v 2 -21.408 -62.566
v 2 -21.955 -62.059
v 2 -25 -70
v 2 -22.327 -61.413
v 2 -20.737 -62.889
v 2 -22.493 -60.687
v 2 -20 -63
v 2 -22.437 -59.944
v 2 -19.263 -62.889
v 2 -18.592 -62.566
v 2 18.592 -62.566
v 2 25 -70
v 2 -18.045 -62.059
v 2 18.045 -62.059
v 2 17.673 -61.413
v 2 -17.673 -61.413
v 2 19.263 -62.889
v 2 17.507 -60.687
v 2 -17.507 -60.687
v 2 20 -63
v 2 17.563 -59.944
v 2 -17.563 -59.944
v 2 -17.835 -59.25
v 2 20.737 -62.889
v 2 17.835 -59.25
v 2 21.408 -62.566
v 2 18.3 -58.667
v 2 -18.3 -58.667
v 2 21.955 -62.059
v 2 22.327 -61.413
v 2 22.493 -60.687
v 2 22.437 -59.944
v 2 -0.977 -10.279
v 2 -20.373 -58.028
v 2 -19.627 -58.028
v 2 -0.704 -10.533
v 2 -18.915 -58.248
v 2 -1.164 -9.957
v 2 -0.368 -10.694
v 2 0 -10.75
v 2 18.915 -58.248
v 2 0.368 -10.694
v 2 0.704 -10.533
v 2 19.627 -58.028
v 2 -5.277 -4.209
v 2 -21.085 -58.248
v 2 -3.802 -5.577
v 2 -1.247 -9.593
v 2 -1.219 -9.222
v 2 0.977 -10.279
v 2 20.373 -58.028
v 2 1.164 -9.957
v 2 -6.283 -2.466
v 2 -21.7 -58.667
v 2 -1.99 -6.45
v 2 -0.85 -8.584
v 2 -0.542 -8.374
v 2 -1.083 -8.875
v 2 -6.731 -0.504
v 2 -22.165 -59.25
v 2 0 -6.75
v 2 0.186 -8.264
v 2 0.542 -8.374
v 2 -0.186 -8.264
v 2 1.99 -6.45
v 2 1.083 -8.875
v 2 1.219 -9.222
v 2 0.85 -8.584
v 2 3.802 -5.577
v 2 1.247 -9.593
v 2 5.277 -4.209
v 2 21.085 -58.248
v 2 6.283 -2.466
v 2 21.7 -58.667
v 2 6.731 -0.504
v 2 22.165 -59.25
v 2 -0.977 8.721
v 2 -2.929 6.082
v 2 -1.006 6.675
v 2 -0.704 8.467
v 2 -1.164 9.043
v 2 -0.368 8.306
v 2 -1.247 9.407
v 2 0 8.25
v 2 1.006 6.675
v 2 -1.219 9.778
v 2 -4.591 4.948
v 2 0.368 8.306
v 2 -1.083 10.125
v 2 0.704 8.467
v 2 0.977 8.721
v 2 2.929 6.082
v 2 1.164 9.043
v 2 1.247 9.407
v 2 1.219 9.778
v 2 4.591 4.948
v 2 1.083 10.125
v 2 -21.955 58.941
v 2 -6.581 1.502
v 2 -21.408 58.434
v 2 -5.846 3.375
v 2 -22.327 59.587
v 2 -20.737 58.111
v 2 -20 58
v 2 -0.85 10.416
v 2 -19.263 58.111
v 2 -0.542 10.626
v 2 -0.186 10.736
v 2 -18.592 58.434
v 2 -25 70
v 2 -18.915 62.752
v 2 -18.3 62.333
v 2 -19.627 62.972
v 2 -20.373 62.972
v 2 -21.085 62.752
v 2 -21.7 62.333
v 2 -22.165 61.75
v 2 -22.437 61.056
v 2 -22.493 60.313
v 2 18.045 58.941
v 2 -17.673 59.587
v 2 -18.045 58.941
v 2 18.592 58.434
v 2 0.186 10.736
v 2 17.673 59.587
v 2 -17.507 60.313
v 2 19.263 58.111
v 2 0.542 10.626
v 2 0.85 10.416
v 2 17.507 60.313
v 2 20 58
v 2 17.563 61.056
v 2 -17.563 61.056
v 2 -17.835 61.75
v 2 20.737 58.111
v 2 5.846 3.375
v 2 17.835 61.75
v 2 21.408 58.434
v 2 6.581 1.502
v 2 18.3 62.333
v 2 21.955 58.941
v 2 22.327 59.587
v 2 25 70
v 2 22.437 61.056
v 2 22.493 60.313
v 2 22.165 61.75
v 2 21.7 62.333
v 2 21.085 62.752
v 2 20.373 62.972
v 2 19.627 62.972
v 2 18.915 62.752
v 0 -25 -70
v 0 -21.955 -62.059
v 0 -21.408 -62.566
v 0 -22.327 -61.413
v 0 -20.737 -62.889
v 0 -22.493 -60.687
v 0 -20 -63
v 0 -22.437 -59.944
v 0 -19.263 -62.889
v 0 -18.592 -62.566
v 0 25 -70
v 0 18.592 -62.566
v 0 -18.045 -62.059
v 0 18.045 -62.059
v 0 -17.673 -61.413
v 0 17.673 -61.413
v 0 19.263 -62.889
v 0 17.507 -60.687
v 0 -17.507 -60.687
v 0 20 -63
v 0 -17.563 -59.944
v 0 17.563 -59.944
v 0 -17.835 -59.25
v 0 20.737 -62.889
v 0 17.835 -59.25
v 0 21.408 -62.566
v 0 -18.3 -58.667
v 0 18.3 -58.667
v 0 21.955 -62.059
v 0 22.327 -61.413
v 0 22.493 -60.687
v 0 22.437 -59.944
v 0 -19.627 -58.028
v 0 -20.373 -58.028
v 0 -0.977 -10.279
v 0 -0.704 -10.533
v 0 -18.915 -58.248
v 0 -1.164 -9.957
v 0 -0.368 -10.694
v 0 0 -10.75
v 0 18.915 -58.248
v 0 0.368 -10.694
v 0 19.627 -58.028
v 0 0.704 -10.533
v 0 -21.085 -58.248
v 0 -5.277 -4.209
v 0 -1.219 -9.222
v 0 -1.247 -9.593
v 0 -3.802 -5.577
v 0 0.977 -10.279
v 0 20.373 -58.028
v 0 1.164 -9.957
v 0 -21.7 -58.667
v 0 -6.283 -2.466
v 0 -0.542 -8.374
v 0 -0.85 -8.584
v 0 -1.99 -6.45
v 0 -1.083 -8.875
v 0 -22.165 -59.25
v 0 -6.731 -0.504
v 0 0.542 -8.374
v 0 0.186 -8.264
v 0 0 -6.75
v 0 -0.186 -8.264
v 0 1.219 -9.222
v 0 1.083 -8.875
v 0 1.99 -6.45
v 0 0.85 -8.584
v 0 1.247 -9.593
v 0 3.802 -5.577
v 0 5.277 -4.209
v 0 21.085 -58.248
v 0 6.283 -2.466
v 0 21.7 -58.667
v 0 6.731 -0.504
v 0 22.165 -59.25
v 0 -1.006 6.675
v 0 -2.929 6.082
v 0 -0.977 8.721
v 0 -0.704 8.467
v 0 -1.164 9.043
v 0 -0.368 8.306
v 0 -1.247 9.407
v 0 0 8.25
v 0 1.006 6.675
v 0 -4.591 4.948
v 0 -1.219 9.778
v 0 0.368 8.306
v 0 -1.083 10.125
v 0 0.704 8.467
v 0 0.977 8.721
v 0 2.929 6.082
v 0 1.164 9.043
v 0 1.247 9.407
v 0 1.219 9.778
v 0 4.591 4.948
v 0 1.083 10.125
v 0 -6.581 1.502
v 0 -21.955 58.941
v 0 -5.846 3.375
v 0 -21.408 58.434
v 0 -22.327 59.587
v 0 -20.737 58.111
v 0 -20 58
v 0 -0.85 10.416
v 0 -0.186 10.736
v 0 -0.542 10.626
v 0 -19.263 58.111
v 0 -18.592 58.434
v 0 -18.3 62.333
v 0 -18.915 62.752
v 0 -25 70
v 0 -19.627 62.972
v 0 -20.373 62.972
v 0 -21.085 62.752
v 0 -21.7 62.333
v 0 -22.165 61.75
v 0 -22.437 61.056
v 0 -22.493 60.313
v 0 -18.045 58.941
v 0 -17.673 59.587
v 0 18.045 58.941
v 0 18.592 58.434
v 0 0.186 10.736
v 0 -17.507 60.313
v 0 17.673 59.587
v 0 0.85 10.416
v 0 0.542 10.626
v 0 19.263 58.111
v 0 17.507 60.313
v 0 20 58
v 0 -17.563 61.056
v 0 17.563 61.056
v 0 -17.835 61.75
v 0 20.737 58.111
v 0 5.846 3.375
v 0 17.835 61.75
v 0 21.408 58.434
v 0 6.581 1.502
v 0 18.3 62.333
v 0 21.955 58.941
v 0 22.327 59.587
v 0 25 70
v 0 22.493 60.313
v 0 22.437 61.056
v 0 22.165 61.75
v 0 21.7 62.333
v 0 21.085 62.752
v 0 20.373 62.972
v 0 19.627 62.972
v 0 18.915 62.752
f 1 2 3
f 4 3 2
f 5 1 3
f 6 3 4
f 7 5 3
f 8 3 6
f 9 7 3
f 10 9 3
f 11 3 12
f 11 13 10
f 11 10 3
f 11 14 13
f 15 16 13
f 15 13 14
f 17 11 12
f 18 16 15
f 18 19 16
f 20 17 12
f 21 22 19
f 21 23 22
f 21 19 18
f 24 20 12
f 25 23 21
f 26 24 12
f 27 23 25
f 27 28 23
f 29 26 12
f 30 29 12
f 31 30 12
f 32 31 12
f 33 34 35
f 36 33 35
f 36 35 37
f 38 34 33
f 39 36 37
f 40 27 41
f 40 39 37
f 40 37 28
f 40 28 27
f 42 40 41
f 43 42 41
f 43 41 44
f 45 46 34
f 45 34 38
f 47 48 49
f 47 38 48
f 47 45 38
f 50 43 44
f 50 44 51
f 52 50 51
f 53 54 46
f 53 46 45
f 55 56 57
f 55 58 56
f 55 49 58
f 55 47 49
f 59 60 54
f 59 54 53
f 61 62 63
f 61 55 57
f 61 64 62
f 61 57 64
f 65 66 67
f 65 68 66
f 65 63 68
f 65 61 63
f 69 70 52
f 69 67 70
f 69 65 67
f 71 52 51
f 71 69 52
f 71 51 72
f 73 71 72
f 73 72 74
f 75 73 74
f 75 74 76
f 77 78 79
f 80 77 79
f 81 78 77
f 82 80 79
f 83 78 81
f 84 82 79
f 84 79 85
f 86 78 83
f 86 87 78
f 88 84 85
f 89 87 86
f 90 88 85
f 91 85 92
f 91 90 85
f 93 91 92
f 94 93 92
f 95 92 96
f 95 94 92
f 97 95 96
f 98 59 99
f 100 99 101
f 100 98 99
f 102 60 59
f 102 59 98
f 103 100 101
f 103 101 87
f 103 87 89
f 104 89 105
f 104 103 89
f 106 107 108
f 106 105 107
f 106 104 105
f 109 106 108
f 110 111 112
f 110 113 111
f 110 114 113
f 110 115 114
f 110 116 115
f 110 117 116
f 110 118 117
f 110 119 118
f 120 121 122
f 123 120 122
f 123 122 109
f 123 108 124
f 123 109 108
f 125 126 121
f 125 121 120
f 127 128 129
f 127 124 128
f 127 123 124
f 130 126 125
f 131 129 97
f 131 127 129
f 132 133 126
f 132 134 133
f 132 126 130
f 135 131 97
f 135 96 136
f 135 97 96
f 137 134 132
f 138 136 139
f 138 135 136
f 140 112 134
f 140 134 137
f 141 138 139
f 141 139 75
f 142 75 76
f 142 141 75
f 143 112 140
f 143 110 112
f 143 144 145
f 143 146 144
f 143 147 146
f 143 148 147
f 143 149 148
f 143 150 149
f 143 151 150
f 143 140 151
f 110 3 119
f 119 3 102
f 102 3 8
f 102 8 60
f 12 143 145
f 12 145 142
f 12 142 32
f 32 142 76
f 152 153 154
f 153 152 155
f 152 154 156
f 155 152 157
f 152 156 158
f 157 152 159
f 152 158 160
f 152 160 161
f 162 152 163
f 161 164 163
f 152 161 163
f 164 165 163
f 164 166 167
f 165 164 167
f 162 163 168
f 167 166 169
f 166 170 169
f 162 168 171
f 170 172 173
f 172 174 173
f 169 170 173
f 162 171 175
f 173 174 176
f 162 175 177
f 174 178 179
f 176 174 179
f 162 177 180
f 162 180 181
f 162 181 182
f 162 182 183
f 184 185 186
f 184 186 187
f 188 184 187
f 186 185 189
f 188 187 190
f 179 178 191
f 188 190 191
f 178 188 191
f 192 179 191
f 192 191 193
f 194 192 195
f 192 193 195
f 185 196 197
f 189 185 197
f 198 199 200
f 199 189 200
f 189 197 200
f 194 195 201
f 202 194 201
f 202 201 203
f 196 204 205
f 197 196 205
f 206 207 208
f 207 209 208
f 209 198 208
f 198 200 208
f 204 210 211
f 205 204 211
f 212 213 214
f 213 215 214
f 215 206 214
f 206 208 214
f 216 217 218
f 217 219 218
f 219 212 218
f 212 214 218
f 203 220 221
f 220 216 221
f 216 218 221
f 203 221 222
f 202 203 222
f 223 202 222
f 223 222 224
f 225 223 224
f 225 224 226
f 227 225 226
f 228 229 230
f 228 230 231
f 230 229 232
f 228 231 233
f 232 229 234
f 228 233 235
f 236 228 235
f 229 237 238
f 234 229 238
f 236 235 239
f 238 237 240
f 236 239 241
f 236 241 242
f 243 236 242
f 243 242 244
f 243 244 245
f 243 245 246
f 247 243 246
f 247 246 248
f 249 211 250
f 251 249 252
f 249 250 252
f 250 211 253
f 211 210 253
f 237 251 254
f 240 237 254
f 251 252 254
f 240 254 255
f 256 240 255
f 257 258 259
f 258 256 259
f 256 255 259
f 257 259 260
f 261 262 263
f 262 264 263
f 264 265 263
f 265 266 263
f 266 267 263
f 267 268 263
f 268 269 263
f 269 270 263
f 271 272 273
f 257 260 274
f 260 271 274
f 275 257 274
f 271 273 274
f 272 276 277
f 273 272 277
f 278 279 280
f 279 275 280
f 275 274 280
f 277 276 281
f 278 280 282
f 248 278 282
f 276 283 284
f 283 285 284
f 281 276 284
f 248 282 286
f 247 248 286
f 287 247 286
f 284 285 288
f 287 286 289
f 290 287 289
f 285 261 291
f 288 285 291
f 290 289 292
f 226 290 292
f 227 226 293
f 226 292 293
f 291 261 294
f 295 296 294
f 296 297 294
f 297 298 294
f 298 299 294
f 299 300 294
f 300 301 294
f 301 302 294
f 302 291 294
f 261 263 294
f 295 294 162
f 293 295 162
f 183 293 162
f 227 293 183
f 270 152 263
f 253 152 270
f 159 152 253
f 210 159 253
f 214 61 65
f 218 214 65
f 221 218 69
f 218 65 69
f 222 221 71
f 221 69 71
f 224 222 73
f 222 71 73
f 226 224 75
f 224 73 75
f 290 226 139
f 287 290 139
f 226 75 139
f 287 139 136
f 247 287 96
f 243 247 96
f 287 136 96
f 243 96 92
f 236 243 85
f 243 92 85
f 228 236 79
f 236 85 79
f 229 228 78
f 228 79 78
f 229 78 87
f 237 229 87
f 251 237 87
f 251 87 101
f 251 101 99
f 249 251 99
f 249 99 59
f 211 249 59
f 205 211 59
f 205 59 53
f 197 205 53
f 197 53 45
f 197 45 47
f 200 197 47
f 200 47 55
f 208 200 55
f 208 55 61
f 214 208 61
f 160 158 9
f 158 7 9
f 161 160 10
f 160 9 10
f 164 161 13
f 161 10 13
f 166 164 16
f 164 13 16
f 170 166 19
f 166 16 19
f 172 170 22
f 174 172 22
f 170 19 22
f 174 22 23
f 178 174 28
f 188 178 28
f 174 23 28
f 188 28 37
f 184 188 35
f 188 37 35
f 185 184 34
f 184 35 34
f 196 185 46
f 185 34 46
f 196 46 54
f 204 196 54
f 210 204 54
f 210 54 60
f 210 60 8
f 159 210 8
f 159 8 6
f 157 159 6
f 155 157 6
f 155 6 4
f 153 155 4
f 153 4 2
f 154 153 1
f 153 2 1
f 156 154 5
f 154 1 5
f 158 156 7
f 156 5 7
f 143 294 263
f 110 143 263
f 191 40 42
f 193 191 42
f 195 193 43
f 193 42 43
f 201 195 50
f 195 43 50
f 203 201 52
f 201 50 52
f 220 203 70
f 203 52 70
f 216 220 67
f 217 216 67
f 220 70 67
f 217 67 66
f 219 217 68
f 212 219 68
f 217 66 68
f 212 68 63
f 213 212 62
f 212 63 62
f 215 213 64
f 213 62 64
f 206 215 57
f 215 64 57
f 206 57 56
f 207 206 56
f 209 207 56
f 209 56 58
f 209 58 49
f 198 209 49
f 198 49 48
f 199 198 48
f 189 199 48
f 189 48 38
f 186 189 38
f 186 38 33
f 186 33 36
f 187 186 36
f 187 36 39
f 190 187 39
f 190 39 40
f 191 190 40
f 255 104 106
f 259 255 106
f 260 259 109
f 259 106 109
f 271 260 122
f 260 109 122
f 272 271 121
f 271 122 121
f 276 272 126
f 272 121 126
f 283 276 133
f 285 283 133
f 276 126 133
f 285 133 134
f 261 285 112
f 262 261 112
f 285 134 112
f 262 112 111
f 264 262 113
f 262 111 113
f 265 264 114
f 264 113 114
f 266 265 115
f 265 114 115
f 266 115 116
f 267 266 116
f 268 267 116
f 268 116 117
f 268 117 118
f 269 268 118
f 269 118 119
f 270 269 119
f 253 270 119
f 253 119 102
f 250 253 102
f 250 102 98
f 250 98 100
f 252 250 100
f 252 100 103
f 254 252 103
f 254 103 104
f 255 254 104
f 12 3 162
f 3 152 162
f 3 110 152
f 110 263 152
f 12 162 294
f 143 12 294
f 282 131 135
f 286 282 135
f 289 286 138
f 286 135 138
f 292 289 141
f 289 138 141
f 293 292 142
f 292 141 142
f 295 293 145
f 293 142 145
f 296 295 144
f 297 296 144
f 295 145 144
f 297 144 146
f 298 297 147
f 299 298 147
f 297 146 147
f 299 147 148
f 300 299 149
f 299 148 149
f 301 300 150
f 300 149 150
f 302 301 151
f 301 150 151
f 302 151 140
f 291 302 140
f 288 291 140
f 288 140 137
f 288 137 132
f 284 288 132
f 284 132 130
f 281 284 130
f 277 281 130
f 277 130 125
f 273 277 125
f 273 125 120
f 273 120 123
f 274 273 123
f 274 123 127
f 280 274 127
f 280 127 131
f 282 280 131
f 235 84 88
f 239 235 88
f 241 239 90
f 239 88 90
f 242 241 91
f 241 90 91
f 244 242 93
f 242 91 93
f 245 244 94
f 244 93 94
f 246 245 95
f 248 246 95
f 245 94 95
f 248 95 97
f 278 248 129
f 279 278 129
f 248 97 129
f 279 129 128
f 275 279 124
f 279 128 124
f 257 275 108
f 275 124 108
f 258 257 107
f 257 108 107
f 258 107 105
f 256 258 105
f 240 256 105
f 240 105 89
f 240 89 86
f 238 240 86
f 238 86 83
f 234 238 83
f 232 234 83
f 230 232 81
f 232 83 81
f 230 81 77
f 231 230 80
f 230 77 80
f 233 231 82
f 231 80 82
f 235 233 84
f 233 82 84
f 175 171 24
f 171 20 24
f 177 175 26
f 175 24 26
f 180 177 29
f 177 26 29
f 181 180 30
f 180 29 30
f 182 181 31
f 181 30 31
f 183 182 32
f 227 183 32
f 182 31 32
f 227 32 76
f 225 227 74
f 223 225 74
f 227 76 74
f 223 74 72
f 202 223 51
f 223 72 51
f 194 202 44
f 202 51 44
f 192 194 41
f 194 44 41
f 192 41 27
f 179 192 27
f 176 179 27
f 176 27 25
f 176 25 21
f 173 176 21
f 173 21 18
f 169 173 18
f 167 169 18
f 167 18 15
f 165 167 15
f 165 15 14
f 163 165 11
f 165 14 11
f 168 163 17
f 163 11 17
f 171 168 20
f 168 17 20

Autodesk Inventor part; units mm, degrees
ref_plane "YZ Plane" through (0, 0, 0) normal (1, 0, 0) x (0, 1, 0)
ref_plane "XZ Plane" through (0, 0, 0) normal (0, 1, 0) x (-1, 0, 0)
ref_plane "XY Plane" through (0, 0, 0) normal (0, 0, 1) x (1, 0, 0)
sketch "Skizze1" plane through (0, 0, 0) normal (1, 0, 0) x (0, 1, 0)
  line L0 (25, 70) -> (-25, 70)
  line L1 (-25, 70) -> (-25, -70)
  line L2 (-25, -70) -> (25, -70)
  line L3 (25, -70) -> (25, 70)
  line L4 (25, 70) -> (-25, -70) construction
  line L5 (-25, 70) -> (25, -70) construction
  point P0 (0, 0)
  dimension "d0" = 140
  dimension "d1" = 50
extrude "Extrusion1" add sketch "Skizze1" along normal blind 2
sketch "Skizze2" plane through (2, 0, 0) normal (1, 0, 0) x (0, 0, -1)
  circle A0 centre (-60.5, 20) radius 2.5
  circle A1 centre (-60.5, -20) radius 2.5
  circle A2 centre (60.5, 20) radius 2.5
  circle A3 centre (60.5, -20) radius 2.5
  point P0 (0, 0)
  dimension "d4" = 5
  dimension "d5" = 5
  dimension "d6" = 5
  dimension "d7" = 5
  dimension "d8" = 121
  dimension "d9" = 60.5
  dimension "d10" = 121
  dimension "d11" = 60.5
  dimension "d12" = 40
  dimension "d13" = 20
extrude "Extrusion2" cut sketch "Skizze2" against normal blind 2
sketch "Skizze3" plane through (2, 0, 0) normal (1, 0, 0) x (0, 0, -1)
  circle A0 centre (0, 0) radius 6.75
  circle A1 centre (9.5, 0) radius 1.25
  circle A2 centre (-9.5, 0) radius 1.25
  dimension "d16" = 2.5
  dimension "d17" = 2.5
  dimension "d18" = 13.5
  dimension "d19" = 19
  dimension "d20" = 9.5
extrude "Extrusion3" cut sketch "Skizze3" against normal blind 2
equation "\"d9\" = 0.5 * d8"
equation "\"d10\" = d8"
equation "\"d11\" = 0.5 * d10"
equation "\"d20\" = 0.5 * d19"
properties part number "Motorhalterplatte"
